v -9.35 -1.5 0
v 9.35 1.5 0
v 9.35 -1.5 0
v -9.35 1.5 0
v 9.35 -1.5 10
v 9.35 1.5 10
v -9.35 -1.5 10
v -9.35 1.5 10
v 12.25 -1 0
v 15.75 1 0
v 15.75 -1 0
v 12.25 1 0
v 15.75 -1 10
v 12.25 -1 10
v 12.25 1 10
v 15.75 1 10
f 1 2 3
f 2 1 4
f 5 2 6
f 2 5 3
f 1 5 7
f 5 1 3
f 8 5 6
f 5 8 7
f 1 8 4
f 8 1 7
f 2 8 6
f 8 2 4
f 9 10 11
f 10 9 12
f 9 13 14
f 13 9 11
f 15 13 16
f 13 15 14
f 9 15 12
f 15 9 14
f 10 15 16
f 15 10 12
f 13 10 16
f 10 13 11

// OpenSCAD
// Built by bench/smallmodels/features/compiler.py from a list of features.
$fn = 64;
difference() {
  union() {
    translate([0, 0, 0]) linear_extrude(height = 10) polygon([[-9.35, -1.5], [9.35, -1.5], [9.35, 1.5], [-9.35, 1.5]]);
    translate([15, 0, 0]) linear_extrude(height = 10) polygon([[-2.75, -1], [2.75, -1], [2.75, 1], [-2.75, 1]]);
  }
  union() {
    translate([-18.7, -5, 0]) rotate([0, 0, 0]) translate([-5, -5, 0]) cube([10, 10, 10]);
    translate([20.75, -2.25, 0]) rotate([0, 0, 0]) translate([-5, -5, 0]) cube([10, 10, 10]);
  }
}
